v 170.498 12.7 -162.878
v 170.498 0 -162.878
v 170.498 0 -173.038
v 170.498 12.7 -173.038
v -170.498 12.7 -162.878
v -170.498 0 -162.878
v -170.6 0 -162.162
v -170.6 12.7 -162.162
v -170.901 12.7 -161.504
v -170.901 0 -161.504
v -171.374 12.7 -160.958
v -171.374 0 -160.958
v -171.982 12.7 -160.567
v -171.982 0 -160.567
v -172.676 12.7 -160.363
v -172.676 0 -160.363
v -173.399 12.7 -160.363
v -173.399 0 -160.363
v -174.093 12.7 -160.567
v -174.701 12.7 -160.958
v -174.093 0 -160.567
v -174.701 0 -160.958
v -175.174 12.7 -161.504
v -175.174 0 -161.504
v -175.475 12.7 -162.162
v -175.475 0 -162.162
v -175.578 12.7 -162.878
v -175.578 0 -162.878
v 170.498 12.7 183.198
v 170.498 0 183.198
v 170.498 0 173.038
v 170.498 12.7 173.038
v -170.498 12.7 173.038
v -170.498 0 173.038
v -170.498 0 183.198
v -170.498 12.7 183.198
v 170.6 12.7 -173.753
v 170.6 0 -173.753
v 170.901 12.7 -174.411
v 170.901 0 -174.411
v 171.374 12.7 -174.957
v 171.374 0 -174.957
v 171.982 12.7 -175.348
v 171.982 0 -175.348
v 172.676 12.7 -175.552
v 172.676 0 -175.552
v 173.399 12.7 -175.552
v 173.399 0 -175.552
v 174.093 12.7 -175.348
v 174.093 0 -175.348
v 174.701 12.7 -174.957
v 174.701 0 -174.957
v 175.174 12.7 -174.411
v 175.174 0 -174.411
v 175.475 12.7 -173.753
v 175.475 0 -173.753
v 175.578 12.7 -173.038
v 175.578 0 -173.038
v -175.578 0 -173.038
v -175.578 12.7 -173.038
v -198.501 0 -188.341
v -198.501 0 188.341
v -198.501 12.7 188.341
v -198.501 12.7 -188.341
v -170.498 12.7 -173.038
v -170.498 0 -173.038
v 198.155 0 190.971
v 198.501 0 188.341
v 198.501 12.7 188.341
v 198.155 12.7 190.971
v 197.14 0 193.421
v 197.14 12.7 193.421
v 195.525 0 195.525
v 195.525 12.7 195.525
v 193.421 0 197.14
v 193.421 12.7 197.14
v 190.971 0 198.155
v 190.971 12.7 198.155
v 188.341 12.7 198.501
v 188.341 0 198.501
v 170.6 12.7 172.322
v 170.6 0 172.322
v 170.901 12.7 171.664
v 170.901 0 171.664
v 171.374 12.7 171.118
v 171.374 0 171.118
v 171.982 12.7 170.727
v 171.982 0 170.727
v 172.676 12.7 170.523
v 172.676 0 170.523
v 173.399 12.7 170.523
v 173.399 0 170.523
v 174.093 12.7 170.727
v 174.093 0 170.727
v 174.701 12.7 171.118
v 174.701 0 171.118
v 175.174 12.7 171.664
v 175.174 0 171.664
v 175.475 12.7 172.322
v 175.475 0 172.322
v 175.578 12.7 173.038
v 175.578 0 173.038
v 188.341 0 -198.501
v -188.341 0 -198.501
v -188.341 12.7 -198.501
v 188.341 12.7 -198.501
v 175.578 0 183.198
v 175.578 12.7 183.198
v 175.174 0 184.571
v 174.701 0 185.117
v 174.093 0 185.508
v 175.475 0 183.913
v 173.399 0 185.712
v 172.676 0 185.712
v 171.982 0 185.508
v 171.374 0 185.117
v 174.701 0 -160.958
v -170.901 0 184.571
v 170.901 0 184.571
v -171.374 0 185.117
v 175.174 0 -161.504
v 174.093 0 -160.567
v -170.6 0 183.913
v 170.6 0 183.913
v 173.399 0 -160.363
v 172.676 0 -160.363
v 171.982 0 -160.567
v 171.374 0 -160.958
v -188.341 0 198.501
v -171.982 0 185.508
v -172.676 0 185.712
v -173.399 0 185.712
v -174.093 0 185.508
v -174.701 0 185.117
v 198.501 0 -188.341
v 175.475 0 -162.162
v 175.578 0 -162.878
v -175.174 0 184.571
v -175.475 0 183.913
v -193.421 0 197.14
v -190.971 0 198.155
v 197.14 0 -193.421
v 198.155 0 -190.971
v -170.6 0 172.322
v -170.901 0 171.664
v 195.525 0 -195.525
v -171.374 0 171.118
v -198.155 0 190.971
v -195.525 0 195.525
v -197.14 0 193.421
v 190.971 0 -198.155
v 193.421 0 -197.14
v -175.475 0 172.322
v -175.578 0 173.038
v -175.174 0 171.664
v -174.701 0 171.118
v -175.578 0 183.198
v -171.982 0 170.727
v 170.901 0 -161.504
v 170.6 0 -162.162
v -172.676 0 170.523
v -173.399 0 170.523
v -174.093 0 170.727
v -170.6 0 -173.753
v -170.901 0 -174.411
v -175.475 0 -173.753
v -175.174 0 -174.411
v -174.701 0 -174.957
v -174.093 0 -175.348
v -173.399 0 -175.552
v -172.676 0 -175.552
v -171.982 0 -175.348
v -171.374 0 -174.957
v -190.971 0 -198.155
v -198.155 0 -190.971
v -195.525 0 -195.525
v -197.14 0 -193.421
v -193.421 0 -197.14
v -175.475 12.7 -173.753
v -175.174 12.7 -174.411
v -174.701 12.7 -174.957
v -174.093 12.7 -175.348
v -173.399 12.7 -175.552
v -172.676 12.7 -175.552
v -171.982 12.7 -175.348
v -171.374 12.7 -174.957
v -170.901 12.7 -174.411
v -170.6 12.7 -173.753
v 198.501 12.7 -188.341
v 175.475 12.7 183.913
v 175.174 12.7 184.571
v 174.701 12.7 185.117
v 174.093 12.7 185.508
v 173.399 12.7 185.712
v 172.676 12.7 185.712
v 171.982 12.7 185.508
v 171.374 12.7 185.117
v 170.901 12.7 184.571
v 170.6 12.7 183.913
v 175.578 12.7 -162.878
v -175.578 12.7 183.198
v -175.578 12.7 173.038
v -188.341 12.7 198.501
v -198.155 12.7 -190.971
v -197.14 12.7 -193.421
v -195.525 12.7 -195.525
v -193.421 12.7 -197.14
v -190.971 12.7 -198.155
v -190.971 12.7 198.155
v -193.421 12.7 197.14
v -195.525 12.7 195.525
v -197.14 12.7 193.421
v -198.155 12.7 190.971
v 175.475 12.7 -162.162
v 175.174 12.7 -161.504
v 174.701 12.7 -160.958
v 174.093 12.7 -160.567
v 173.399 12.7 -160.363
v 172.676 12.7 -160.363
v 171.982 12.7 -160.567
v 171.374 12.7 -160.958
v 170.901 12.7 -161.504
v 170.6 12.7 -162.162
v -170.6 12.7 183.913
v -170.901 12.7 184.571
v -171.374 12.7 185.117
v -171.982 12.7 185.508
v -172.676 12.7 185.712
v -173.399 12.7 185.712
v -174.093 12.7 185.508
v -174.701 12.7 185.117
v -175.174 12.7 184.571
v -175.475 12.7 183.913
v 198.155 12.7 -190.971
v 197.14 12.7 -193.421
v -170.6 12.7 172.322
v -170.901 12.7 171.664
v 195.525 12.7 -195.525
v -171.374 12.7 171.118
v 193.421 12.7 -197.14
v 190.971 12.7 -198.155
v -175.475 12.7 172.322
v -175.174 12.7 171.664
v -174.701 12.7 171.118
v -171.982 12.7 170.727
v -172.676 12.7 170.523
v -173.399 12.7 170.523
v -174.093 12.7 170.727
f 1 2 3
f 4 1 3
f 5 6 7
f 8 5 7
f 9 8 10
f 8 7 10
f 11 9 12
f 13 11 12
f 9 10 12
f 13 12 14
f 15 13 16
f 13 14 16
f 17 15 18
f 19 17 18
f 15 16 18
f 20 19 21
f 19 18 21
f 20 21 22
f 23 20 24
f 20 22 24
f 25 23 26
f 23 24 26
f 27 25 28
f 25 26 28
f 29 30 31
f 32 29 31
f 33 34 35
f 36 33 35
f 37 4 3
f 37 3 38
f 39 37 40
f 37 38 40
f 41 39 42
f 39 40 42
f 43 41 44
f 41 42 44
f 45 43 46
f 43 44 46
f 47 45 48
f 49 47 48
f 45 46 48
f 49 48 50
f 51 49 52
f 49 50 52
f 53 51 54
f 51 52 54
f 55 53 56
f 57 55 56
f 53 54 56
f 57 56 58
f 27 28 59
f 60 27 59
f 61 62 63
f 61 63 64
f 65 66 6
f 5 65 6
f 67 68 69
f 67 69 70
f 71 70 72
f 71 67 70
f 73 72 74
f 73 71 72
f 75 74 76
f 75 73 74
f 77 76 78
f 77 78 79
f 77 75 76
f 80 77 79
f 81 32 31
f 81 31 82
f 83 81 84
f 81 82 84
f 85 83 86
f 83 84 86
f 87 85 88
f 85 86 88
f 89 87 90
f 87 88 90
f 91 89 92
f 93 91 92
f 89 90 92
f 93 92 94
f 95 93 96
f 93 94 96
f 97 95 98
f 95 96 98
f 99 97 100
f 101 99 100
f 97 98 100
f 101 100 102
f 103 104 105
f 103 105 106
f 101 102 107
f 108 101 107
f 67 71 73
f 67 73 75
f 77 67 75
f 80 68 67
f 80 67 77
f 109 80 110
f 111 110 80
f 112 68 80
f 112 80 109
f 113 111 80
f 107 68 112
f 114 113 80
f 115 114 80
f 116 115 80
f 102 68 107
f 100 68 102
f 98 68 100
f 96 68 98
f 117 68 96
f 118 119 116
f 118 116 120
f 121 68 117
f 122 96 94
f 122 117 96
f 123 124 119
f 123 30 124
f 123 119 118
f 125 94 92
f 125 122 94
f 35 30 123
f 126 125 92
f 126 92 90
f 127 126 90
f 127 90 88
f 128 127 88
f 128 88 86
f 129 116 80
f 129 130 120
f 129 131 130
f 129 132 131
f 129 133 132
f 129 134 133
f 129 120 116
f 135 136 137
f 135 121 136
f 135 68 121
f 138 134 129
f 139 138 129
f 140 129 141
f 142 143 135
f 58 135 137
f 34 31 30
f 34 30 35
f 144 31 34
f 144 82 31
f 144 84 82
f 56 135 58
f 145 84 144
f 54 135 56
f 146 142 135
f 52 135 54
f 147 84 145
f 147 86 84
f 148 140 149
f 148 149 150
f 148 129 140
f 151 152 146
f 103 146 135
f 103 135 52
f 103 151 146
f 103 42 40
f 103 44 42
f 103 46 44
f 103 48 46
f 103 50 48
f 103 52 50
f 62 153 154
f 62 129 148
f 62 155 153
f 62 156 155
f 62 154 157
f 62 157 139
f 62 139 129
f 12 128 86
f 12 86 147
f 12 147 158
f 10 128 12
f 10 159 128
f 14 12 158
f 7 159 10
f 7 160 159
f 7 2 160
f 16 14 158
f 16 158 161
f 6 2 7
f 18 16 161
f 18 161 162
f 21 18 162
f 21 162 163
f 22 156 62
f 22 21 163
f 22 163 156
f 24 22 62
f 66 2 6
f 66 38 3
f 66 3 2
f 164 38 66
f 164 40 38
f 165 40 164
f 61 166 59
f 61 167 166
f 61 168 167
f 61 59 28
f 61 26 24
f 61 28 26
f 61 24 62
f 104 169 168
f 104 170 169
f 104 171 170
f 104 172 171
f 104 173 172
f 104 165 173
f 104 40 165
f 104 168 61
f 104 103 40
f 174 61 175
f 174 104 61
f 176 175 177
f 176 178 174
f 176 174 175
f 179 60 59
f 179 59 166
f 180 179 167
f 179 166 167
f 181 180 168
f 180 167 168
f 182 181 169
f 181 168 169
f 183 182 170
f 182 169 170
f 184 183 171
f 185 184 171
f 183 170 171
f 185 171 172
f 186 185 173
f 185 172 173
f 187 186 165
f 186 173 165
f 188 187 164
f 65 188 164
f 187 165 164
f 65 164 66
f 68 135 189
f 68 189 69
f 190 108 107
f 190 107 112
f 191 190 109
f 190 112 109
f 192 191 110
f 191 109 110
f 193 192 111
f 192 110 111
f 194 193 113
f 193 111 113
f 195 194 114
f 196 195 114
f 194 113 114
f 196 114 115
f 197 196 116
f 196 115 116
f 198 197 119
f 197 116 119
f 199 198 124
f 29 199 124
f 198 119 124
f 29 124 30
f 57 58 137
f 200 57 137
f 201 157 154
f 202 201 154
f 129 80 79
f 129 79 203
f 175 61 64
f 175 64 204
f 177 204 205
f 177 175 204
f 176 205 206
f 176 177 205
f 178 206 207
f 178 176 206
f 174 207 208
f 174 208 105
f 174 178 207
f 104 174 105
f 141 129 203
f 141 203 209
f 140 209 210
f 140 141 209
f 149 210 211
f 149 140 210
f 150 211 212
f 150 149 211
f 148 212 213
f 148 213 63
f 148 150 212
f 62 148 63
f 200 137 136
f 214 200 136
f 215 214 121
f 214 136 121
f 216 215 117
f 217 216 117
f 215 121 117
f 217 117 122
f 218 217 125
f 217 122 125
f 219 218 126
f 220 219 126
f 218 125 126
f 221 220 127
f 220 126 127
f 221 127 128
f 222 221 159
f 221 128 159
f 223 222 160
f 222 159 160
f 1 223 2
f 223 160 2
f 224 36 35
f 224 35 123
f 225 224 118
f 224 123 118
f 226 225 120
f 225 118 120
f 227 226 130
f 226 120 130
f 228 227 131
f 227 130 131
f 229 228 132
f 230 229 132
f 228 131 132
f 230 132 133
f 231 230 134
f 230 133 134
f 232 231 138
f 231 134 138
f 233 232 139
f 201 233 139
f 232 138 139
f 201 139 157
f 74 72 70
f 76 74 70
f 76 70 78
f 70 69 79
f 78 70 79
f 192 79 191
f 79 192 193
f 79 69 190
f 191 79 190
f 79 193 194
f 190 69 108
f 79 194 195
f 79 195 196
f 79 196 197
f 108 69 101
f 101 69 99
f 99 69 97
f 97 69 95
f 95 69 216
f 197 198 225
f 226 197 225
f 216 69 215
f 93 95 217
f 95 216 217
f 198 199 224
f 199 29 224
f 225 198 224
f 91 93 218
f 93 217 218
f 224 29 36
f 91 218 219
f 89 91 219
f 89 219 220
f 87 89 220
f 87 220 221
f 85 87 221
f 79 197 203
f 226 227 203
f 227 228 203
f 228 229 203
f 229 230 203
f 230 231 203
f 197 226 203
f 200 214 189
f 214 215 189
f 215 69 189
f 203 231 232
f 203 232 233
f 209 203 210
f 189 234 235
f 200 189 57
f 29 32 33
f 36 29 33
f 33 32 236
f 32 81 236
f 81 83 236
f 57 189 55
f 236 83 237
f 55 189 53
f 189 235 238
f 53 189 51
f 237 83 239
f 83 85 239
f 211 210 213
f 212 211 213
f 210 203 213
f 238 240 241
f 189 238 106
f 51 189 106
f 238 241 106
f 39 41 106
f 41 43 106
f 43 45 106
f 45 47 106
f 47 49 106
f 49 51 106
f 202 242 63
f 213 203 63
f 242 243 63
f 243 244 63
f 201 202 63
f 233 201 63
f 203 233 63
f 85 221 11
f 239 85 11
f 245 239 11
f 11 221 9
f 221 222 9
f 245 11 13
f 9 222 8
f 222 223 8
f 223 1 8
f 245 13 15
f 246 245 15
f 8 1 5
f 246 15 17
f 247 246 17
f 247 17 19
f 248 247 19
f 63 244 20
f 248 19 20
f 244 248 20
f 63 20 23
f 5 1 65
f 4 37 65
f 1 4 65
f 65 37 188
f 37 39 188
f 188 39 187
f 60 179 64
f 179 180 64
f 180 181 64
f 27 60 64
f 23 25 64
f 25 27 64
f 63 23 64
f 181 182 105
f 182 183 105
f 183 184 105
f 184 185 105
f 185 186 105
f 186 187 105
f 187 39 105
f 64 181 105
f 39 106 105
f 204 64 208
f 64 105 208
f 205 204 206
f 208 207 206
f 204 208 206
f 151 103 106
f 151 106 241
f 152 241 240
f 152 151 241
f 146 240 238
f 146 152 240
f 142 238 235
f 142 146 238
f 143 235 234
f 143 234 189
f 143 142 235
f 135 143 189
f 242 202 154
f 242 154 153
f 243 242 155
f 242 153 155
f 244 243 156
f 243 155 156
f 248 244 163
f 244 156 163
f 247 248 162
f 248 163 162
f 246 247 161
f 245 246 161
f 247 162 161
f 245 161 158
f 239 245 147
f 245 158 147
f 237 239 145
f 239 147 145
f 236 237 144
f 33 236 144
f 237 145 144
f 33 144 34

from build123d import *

# Parameters (mm, degrees)
BOSS_EXTRUDE1_DEPTH = 12.7


with BuildPart() as part:
    # Sketch1 → Boss-Extrude1 (new body)
    with BuildSketch(Plane(origin=(0, 0, 0), x_dir=(1, 0, 0), z_dir=(0, 1, 0))):
        with BuildLine():
            Line((-188.341, 198.501), (188.341, 198.501))
            ThreePointArc((188.341, 198.501), (195.525204897, 195.525204897), (198.501, 188.341))
            Line((198.501, 188.341), (198.501, -188.341))
            ThreePointArc((198.501, -188.341), (195.525204897, -195.525204897), (188.341, -198.501))
            Line((188.341, -198.501), (-188.341, -198.501))
            ThreePointArc((-188.341, -198.501), (-195.525204897, -195.525204897), (-198.501, -188.341))
            Line((-198.501, -188.341), (-198.501, 188.341))
            ThreePointArc((-198.501, 188.341), (-195.525204897, 195.525204897), (-188.341, 198.501))
        make_face()
        with BuildLine():
            Line((-170.4975, 173.0375), (-170.4975, 162.8775))
            ThreePointArc((-170.4975, 162.8775), (-173.0375, 160.3375), (-175.5775, 162.8775))
            Line((-175.5775, 162.8775), (-175.5775, 173.0375))
            ThreePointArc((-175.5775, 173.0375), (-173.0375, 175.5775), (-170.4975, 173.0375))
        make_face(mode=Mode.SUBTRACT)
        with BuildLine():
            Line((175.5775, 173.0375), (175.5775, 162.8775))
            ThreePointArc((175.5775, 162.8775), (173.0375, 160.3375), (170.4975, 162.8775))
            Line((170.4975, 162.8775), (170.4975, 173.0375))
            ThreePointArc((170.4975, 173.0375), (173.0375, 175.5775), (175.5775, 173.0375))
        make_face(mode=Mode.SUBTRACT)
        with BuildLine():
            Line((-170.4975, -173.0375), (-170.4975, -183.1975))
            ThreePointArc((-170.4975, -183.1975), (-173.0375, -185.7375), (-175.5775, -183.1975))
            Line((-175.5775, -183.1975), (-175.5775, -173.0375))
            ThreePointArc((-175.5775, -173.0375), (-173.0375, -170.4975), (-170.4975, -173.0375))
        make_face(mode=Mode.SUBTRACT)
        with BuildLine():
            Line((175.5775, -173.0375), (175.5775, -183.1975))
            ThreePointArc((175.5775, -183.1975), (173.0375, -185.7375), (170.4975, -183.1975))
            Line((170.4975, -183.1975), (170.4975, -173.0375))
            ThreePointArc((170.4975, -173.0375), (173.0375, -170.4975), (175.5775, -173.0375))
        make_face(mode=Mode.SUBTRACT)
    extrude(amount=BOSS_EXTRUDE1_DEPTH)


solid = part.part
